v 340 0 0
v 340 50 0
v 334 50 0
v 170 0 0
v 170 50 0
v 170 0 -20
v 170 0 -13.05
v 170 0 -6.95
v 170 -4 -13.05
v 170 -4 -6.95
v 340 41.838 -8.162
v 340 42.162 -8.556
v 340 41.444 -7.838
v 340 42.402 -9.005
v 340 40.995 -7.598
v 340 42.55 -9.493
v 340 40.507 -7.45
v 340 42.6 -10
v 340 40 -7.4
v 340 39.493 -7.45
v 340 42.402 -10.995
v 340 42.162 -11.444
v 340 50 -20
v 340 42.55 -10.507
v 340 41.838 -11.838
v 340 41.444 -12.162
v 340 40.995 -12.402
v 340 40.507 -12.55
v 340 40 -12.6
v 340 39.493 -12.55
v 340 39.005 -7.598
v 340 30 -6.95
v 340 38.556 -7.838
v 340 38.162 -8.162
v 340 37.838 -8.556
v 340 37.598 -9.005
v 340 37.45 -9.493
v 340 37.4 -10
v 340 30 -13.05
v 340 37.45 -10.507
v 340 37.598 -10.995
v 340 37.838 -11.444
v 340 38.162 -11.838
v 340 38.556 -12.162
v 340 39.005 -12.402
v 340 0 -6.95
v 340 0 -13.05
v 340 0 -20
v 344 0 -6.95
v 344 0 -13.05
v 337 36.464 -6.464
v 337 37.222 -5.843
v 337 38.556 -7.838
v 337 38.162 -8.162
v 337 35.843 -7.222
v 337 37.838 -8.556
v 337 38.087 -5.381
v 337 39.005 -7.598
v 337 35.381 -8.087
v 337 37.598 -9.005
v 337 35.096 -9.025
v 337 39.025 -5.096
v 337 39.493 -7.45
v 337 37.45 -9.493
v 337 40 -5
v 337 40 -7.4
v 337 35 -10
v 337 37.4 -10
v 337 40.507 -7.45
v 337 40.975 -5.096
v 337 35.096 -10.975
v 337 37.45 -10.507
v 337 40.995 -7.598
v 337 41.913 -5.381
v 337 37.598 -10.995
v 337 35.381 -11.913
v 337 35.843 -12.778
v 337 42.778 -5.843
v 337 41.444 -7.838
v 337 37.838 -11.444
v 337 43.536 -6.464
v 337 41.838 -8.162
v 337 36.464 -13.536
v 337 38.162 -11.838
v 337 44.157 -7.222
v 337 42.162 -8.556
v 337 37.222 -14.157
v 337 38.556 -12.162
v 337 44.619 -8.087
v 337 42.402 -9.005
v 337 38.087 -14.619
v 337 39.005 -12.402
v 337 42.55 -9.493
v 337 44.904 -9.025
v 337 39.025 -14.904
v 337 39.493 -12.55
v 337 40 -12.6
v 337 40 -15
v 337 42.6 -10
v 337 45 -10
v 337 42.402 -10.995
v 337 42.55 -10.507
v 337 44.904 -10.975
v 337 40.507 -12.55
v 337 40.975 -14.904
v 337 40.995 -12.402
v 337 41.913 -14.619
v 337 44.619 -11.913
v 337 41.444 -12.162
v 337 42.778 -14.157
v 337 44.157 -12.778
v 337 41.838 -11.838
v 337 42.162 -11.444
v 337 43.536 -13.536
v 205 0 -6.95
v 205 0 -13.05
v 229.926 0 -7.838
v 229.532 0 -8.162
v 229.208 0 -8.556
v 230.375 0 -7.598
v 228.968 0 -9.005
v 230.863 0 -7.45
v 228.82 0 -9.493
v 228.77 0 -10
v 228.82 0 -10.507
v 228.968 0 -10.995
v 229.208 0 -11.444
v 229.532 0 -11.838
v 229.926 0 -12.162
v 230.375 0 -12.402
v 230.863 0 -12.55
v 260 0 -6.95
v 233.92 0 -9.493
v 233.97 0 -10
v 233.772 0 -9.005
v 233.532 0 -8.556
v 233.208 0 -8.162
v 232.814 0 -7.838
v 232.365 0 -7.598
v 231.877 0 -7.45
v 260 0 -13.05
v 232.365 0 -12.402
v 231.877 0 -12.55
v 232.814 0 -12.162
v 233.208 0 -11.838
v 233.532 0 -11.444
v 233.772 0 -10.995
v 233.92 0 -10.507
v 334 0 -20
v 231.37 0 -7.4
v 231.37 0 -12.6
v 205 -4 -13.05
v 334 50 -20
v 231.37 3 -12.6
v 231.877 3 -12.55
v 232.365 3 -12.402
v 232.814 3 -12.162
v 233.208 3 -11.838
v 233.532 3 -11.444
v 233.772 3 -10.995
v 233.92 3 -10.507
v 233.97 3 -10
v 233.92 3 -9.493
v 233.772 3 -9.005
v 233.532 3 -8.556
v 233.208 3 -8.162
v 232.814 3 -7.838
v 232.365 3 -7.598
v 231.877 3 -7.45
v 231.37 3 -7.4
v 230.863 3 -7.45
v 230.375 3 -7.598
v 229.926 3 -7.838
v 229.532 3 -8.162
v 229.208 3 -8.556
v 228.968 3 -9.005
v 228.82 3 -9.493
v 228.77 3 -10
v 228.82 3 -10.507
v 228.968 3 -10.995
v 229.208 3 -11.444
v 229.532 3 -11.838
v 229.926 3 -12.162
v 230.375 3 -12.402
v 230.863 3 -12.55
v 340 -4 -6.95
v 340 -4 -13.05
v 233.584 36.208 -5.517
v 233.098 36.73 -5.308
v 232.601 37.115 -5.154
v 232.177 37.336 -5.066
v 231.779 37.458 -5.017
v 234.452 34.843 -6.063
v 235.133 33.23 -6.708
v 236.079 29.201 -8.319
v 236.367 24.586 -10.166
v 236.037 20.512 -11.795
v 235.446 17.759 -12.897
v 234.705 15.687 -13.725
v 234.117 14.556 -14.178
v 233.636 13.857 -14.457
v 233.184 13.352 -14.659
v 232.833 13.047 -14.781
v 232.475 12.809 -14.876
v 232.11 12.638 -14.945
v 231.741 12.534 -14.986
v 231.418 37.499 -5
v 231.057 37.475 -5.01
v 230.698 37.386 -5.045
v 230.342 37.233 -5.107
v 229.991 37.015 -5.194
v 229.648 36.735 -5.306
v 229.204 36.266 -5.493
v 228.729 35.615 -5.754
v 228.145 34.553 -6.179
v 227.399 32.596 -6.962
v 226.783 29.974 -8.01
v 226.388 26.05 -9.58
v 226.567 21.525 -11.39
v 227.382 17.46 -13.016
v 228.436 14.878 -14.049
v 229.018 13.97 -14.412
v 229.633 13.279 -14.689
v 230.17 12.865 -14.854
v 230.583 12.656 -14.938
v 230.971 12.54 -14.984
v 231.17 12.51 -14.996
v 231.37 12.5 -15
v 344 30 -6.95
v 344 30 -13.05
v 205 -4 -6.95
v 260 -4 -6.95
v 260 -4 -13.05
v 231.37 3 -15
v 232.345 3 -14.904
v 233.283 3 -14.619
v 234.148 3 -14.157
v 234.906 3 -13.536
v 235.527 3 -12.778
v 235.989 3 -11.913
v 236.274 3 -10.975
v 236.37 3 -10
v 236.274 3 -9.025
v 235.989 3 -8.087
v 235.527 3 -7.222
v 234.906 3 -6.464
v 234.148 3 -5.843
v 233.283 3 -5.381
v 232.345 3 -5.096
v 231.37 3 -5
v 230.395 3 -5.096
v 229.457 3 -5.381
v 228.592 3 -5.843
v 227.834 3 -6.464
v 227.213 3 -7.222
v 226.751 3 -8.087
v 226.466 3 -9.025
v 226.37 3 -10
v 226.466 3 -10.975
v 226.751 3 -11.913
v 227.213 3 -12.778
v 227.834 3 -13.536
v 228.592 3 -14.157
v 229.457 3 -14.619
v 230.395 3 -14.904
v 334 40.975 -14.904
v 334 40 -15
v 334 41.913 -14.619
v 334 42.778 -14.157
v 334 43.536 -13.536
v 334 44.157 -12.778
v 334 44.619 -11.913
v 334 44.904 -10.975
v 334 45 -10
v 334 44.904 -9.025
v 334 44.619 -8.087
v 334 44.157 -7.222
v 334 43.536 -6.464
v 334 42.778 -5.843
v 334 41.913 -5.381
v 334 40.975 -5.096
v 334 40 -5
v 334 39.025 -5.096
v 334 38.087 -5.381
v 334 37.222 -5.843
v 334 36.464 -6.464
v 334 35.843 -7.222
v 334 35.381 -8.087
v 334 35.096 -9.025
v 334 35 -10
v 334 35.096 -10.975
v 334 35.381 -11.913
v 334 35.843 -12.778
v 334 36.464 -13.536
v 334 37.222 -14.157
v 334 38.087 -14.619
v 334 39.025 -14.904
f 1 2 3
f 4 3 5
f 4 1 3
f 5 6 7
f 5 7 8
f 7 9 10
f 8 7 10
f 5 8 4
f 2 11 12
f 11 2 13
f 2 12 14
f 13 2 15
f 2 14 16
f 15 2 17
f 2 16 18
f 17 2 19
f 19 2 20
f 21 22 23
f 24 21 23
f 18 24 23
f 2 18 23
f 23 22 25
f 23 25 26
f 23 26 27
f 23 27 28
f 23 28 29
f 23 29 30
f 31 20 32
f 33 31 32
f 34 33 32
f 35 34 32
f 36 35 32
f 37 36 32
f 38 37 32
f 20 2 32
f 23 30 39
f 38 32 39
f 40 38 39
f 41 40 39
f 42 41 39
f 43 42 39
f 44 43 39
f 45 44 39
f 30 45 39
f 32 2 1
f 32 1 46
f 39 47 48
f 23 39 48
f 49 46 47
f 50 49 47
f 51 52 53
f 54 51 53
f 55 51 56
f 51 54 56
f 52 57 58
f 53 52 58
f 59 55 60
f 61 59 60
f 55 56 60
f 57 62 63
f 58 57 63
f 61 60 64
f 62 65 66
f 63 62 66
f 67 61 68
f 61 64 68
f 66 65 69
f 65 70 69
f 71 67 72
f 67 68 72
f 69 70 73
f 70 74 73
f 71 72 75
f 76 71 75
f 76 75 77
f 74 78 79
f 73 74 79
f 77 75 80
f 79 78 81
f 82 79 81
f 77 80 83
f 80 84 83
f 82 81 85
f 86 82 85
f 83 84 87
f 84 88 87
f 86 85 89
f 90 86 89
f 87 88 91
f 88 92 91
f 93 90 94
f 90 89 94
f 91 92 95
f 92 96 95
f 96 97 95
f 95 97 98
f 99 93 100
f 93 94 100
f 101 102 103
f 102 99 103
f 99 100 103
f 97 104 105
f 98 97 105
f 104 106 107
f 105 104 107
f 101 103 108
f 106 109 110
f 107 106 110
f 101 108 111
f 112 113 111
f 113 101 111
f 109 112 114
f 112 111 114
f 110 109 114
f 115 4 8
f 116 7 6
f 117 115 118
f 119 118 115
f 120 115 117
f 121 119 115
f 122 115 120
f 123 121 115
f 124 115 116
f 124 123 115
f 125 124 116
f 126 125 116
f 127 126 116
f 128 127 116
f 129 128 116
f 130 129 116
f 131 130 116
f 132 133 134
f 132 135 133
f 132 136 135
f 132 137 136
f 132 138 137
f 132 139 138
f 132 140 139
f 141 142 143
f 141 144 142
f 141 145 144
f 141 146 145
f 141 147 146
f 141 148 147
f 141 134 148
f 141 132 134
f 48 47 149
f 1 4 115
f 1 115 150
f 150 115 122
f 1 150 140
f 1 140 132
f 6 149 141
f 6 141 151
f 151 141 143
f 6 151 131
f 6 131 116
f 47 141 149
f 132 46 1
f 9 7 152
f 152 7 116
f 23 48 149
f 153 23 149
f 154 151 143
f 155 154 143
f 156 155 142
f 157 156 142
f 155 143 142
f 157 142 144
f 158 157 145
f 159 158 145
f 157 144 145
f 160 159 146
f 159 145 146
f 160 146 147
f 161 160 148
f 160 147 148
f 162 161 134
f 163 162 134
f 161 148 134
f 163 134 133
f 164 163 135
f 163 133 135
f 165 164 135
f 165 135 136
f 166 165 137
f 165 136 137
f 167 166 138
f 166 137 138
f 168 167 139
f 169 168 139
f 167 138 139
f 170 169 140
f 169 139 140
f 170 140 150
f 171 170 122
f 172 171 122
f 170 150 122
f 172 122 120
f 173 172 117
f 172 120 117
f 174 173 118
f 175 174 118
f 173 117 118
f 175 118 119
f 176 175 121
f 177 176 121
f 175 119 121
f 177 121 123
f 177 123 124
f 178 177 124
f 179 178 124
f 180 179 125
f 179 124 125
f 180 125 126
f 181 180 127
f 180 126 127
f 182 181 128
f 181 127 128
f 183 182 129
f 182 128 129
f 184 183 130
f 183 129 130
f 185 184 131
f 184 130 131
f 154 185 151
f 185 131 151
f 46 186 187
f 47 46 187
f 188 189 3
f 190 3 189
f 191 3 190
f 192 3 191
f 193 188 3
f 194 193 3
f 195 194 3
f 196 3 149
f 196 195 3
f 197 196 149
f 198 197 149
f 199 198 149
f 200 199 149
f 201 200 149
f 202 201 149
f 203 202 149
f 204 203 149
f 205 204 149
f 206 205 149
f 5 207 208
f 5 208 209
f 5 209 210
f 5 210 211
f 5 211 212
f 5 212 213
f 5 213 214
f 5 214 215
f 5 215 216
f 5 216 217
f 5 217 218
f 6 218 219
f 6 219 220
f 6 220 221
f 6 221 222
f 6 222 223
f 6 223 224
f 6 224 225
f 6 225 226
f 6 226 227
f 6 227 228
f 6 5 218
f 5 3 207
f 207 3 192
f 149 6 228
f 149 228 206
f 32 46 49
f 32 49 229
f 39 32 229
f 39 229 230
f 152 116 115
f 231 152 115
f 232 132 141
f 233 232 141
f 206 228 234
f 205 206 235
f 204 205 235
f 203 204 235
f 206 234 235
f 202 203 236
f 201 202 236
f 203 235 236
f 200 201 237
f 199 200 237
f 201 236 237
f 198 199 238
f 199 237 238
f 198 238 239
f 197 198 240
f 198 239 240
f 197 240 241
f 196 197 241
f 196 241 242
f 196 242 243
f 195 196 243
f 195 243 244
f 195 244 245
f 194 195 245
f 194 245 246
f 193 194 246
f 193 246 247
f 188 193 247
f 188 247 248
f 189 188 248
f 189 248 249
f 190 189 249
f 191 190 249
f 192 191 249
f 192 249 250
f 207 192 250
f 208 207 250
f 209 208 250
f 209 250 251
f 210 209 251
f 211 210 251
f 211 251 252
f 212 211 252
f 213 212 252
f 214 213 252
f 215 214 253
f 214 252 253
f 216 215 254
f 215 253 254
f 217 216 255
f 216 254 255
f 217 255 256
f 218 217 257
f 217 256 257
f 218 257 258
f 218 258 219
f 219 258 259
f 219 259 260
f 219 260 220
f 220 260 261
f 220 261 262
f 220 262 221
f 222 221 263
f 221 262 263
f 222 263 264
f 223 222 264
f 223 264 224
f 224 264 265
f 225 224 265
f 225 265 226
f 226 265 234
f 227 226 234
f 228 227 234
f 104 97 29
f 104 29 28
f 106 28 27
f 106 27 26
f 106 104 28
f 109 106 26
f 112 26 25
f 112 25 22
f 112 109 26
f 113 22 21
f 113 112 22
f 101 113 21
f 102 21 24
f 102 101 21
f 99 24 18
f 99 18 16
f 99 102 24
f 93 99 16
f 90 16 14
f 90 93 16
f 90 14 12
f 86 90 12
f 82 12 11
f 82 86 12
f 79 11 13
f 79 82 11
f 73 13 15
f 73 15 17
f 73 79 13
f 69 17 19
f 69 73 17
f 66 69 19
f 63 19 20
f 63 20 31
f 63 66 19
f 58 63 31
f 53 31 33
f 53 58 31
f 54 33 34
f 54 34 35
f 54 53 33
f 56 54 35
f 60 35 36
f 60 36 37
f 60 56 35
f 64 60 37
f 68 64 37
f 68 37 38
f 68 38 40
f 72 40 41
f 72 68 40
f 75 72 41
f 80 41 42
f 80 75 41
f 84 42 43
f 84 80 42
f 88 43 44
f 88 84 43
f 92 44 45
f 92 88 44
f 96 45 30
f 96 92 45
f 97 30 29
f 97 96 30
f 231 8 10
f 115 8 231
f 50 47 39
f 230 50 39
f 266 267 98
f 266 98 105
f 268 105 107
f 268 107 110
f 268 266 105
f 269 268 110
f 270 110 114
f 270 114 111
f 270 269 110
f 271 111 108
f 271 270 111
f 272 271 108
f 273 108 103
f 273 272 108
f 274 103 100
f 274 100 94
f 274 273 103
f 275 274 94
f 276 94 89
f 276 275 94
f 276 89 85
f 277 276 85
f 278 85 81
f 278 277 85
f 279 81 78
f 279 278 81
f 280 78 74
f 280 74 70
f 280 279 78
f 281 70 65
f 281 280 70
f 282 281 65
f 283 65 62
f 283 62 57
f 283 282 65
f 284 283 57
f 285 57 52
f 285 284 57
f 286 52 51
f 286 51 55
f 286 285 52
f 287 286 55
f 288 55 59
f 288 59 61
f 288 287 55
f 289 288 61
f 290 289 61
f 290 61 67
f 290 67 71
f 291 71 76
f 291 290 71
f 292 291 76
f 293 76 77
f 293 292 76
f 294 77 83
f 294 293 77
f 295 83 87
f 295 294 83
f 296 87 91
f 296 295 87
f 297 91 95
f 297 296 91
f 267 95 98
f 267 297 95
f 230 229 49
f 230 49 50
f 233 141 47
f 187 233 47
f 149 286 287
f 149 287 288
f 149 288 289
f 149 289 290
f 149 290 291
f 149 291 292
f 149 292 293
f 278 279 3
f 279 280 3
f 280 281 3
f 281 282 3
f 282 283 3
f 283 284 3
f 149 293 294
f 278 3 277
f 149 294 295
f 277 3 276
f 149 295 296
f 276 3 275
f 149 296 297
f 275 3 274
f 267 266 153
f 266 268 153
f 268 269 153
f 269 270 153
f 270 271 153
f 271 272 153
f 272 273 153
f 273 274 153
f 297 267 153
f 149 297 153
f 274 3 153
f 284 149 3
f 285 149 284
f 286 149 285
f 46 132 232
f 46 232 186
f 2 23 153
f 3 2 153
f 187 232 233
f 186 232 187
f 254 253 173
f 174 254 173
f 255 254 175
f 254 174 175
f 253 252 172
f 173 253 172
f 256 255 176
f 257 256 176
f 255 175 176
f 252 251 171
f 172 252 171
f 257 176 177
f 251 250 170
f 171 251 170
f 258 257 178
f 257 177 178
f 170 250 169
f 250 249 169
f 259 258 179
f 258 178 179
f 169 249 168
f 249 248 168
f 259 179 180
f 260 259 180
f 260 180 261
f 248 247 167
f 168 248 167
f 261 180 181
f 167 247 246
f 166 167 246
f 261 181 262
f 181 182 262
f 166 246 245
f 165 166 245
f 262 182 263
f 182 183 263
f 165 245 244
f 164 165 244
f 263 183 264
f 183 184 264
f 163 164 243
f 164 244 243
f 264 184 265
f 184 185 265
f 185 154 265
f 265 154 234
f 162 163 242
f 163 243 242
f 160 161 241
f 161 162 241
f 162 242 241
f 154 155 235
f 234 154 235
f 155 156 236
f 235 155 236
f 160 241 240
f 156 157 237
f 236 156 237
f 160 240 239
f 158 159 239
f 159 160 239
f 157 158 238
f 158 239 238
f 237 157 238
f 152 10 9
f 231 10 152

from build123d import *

# Parameters (mm, degrees)
SKETCH_1_W          = 170
SKETCH_1_H          = 20
EXTRUDE_1_DEPTH     = 50
CUT_EXTRUDE_2_DEPTH = 164
SKETCH_3_R          = 5
CUT_EXTRUDE_3_DEPTH = 3
SKETCH_4_R          = 2.6
CUT_EXTRUDE_4_DEPTH = 3
SKETCH_5_W          = 170
SKETCH_5_H          = 20
CUT_EXTRUDE_5_DEPTH = 400
SKETCH_6_R          = 5
CUT_EXTRUDE_6_DEPTH = 400
SKETCH_7_R          = 5
SKETCH_7_R_2        = 2.6
EXTRUDE_2_DEPTH     = 3
SKETCH_8_W          = 35
SKETCH_8_H          = 3.05
SKETCH_8_W_2        = 80
EXTRUDE_3_DEPTH     = 4
SKETCH_9_W          = 6.1
SKETCH_9_H          = 30
EXTRUDE_4_DEPTH     = 4


with BuildPart() as part:
    # 草图1 → 凸台-拉伸1 (new body)
    with BuildSketch(Plane(origin=(0, 0, 0), x_dir=(1, 0, 0), z_dir=(0, 1, 0))):
        with Locations((85, 10)):
            Rectangle(SKETCH_1_W, SKETCH_1_H)
    extrude_1 = extrude(amount=EXTRUDE_1_DEPTH)

    # 草图2 → 切除-拉伸2 (cut)
    with BuildSketch(Plane(origin=(170, 0, 0), x_dir=(0, 0, -1), z_dir=(1, 0, 0))):
        Polygon((0, 50), (20, 0), (20, 50), align=None)
    cut_extrude_2 = extrude(amount=-CUT_EXTRUDE_2_DEPTH, mode=Mode.SUBTRACT)

    # 草图3 → 切除-拉伸3 (cut)
    with BuildSketch(Plane(origin=(6, 0, 0), x_dir=(0, 0, -1), z_dir=(1, 0, 0))):
        with Locations((10, 40)):
            Circle(SKETCH_3_R)
    cut_extrude_3 = extrude(amount=-CUT_EXTRUDE_3_DEPTH, mode=Mode.SUBTRACT)

    # 草图4 → 切除-拉伸4 (cut)
    with BuildSketch(Plane(origin=(3, 0, 0), x_dir=(0, 0, -1), z_dir=(1, 0, 0))):
        with Locations((10, 40)):
            Circle(SKETCH_4_R)
    cut_extrude_4 = extrude(amount=-CUT_EXTRUDE_4_DEPTH, mode=Mode.SUBTRACT)

    # 镜向1: 凸台-拉伸1, 切除-拉伸2, 切除-拉伸3, 切除-拉伸4 across plane
    add(extrude_1.mirror(Plane(origin=(170, 50, 0), x_dir=(0, 0, 1), z_dir=(-1, 0, 0))))
    add(cut_extrude_2.mirror(Plane(origin=(170, 50, 0), x_dir=(0, 0, 1), z_dir=(-1, 0, 0))), mode=Mode.SUBTRACT)
    add(cut_extrude_3.mirror(Plane(origin=(170, 50, 0), x_dir=(0, 0, 1), z_dir=(-1, 0, 0))), mode=Mode.SUBTRACT)
    add(cut_extrude_4.mirror(Plane(origin=(170, 50, 0), x_dir=(0, 0, 1), z_dir=(-1, 0, 0))), mode=Mode.SUBTRACT)

    # 草图5 → 切除-拉伸5 (cut)
    with BuildSketch(Plane.XZ):
        with Locations((85, -10)):
            Rectangle(SKETCH_5_W, SKETCH_5_H)
    extrude(amount=-CUT_EXTRUDE_5_DEPTH, mode=Mode.SUBTRACT)

    # 草图6 → 切除-拉伸6 (cut)
    with BuildSketch(Plane.XZ):
        with Locations(Location((231.37, -10, 0), (0, 0, 270))):
            Circle(SKETCH_6_R)
    extrude(amount=-CUT_EXTRUDE_6_DEPTH, mode=Mode.SUBTRACT)

    # 草图7 → 凸台-拉伸2 (add)
    with BuildSketch(Plane.XZ):
        with Locations(Location((231.37, -10, 0), (0, 0, 270))):
            Circle(SKETCH_7_R)
        with Locations(Location((231.37, -10, 0), (0, 0, 270))):
            Circle(SKETCH_7_R_2, mode=Mode.SUBTRACT)
    extrude(amount=-EXTRUDE_2_DEPTH)

    # 草图8 → 凸台-拉伸3 (add)
    with BuildSketch(Plane.XZ):
        with Locations((187.5, -8.475)):
            Rectangle(SKETCH_8_W, SKETCH_8_H)
        with Locations((187.5, -11.525)):
            Rectangle(SKETCH_8_W, SKETCH_8_H)
        with Locations((300, -8.475)):
            Rectangle(SKETCH_8_W_2, SKETCH_8_H)
        with Locations((300, -11.525)):
            Rectangle(SKETCH_8_W_2, SKETCH_8_H)
    extrude(amount=EXTRUDE_3_DEPTH)

    # 草图9 → 凸台-拉伸4 (add)
    with BuildSketch(Plane(origin=(340, 0, 0), x_dir=(0, 0, -1), z_dir=(1, 0, 0))):
        with Locations((10, 15)):
            Rectangle(SKETCH_9_W, SKETCH_9_H)
    extrude(amount=EXTRUDE_4_DEPTH)


solid = part.part
